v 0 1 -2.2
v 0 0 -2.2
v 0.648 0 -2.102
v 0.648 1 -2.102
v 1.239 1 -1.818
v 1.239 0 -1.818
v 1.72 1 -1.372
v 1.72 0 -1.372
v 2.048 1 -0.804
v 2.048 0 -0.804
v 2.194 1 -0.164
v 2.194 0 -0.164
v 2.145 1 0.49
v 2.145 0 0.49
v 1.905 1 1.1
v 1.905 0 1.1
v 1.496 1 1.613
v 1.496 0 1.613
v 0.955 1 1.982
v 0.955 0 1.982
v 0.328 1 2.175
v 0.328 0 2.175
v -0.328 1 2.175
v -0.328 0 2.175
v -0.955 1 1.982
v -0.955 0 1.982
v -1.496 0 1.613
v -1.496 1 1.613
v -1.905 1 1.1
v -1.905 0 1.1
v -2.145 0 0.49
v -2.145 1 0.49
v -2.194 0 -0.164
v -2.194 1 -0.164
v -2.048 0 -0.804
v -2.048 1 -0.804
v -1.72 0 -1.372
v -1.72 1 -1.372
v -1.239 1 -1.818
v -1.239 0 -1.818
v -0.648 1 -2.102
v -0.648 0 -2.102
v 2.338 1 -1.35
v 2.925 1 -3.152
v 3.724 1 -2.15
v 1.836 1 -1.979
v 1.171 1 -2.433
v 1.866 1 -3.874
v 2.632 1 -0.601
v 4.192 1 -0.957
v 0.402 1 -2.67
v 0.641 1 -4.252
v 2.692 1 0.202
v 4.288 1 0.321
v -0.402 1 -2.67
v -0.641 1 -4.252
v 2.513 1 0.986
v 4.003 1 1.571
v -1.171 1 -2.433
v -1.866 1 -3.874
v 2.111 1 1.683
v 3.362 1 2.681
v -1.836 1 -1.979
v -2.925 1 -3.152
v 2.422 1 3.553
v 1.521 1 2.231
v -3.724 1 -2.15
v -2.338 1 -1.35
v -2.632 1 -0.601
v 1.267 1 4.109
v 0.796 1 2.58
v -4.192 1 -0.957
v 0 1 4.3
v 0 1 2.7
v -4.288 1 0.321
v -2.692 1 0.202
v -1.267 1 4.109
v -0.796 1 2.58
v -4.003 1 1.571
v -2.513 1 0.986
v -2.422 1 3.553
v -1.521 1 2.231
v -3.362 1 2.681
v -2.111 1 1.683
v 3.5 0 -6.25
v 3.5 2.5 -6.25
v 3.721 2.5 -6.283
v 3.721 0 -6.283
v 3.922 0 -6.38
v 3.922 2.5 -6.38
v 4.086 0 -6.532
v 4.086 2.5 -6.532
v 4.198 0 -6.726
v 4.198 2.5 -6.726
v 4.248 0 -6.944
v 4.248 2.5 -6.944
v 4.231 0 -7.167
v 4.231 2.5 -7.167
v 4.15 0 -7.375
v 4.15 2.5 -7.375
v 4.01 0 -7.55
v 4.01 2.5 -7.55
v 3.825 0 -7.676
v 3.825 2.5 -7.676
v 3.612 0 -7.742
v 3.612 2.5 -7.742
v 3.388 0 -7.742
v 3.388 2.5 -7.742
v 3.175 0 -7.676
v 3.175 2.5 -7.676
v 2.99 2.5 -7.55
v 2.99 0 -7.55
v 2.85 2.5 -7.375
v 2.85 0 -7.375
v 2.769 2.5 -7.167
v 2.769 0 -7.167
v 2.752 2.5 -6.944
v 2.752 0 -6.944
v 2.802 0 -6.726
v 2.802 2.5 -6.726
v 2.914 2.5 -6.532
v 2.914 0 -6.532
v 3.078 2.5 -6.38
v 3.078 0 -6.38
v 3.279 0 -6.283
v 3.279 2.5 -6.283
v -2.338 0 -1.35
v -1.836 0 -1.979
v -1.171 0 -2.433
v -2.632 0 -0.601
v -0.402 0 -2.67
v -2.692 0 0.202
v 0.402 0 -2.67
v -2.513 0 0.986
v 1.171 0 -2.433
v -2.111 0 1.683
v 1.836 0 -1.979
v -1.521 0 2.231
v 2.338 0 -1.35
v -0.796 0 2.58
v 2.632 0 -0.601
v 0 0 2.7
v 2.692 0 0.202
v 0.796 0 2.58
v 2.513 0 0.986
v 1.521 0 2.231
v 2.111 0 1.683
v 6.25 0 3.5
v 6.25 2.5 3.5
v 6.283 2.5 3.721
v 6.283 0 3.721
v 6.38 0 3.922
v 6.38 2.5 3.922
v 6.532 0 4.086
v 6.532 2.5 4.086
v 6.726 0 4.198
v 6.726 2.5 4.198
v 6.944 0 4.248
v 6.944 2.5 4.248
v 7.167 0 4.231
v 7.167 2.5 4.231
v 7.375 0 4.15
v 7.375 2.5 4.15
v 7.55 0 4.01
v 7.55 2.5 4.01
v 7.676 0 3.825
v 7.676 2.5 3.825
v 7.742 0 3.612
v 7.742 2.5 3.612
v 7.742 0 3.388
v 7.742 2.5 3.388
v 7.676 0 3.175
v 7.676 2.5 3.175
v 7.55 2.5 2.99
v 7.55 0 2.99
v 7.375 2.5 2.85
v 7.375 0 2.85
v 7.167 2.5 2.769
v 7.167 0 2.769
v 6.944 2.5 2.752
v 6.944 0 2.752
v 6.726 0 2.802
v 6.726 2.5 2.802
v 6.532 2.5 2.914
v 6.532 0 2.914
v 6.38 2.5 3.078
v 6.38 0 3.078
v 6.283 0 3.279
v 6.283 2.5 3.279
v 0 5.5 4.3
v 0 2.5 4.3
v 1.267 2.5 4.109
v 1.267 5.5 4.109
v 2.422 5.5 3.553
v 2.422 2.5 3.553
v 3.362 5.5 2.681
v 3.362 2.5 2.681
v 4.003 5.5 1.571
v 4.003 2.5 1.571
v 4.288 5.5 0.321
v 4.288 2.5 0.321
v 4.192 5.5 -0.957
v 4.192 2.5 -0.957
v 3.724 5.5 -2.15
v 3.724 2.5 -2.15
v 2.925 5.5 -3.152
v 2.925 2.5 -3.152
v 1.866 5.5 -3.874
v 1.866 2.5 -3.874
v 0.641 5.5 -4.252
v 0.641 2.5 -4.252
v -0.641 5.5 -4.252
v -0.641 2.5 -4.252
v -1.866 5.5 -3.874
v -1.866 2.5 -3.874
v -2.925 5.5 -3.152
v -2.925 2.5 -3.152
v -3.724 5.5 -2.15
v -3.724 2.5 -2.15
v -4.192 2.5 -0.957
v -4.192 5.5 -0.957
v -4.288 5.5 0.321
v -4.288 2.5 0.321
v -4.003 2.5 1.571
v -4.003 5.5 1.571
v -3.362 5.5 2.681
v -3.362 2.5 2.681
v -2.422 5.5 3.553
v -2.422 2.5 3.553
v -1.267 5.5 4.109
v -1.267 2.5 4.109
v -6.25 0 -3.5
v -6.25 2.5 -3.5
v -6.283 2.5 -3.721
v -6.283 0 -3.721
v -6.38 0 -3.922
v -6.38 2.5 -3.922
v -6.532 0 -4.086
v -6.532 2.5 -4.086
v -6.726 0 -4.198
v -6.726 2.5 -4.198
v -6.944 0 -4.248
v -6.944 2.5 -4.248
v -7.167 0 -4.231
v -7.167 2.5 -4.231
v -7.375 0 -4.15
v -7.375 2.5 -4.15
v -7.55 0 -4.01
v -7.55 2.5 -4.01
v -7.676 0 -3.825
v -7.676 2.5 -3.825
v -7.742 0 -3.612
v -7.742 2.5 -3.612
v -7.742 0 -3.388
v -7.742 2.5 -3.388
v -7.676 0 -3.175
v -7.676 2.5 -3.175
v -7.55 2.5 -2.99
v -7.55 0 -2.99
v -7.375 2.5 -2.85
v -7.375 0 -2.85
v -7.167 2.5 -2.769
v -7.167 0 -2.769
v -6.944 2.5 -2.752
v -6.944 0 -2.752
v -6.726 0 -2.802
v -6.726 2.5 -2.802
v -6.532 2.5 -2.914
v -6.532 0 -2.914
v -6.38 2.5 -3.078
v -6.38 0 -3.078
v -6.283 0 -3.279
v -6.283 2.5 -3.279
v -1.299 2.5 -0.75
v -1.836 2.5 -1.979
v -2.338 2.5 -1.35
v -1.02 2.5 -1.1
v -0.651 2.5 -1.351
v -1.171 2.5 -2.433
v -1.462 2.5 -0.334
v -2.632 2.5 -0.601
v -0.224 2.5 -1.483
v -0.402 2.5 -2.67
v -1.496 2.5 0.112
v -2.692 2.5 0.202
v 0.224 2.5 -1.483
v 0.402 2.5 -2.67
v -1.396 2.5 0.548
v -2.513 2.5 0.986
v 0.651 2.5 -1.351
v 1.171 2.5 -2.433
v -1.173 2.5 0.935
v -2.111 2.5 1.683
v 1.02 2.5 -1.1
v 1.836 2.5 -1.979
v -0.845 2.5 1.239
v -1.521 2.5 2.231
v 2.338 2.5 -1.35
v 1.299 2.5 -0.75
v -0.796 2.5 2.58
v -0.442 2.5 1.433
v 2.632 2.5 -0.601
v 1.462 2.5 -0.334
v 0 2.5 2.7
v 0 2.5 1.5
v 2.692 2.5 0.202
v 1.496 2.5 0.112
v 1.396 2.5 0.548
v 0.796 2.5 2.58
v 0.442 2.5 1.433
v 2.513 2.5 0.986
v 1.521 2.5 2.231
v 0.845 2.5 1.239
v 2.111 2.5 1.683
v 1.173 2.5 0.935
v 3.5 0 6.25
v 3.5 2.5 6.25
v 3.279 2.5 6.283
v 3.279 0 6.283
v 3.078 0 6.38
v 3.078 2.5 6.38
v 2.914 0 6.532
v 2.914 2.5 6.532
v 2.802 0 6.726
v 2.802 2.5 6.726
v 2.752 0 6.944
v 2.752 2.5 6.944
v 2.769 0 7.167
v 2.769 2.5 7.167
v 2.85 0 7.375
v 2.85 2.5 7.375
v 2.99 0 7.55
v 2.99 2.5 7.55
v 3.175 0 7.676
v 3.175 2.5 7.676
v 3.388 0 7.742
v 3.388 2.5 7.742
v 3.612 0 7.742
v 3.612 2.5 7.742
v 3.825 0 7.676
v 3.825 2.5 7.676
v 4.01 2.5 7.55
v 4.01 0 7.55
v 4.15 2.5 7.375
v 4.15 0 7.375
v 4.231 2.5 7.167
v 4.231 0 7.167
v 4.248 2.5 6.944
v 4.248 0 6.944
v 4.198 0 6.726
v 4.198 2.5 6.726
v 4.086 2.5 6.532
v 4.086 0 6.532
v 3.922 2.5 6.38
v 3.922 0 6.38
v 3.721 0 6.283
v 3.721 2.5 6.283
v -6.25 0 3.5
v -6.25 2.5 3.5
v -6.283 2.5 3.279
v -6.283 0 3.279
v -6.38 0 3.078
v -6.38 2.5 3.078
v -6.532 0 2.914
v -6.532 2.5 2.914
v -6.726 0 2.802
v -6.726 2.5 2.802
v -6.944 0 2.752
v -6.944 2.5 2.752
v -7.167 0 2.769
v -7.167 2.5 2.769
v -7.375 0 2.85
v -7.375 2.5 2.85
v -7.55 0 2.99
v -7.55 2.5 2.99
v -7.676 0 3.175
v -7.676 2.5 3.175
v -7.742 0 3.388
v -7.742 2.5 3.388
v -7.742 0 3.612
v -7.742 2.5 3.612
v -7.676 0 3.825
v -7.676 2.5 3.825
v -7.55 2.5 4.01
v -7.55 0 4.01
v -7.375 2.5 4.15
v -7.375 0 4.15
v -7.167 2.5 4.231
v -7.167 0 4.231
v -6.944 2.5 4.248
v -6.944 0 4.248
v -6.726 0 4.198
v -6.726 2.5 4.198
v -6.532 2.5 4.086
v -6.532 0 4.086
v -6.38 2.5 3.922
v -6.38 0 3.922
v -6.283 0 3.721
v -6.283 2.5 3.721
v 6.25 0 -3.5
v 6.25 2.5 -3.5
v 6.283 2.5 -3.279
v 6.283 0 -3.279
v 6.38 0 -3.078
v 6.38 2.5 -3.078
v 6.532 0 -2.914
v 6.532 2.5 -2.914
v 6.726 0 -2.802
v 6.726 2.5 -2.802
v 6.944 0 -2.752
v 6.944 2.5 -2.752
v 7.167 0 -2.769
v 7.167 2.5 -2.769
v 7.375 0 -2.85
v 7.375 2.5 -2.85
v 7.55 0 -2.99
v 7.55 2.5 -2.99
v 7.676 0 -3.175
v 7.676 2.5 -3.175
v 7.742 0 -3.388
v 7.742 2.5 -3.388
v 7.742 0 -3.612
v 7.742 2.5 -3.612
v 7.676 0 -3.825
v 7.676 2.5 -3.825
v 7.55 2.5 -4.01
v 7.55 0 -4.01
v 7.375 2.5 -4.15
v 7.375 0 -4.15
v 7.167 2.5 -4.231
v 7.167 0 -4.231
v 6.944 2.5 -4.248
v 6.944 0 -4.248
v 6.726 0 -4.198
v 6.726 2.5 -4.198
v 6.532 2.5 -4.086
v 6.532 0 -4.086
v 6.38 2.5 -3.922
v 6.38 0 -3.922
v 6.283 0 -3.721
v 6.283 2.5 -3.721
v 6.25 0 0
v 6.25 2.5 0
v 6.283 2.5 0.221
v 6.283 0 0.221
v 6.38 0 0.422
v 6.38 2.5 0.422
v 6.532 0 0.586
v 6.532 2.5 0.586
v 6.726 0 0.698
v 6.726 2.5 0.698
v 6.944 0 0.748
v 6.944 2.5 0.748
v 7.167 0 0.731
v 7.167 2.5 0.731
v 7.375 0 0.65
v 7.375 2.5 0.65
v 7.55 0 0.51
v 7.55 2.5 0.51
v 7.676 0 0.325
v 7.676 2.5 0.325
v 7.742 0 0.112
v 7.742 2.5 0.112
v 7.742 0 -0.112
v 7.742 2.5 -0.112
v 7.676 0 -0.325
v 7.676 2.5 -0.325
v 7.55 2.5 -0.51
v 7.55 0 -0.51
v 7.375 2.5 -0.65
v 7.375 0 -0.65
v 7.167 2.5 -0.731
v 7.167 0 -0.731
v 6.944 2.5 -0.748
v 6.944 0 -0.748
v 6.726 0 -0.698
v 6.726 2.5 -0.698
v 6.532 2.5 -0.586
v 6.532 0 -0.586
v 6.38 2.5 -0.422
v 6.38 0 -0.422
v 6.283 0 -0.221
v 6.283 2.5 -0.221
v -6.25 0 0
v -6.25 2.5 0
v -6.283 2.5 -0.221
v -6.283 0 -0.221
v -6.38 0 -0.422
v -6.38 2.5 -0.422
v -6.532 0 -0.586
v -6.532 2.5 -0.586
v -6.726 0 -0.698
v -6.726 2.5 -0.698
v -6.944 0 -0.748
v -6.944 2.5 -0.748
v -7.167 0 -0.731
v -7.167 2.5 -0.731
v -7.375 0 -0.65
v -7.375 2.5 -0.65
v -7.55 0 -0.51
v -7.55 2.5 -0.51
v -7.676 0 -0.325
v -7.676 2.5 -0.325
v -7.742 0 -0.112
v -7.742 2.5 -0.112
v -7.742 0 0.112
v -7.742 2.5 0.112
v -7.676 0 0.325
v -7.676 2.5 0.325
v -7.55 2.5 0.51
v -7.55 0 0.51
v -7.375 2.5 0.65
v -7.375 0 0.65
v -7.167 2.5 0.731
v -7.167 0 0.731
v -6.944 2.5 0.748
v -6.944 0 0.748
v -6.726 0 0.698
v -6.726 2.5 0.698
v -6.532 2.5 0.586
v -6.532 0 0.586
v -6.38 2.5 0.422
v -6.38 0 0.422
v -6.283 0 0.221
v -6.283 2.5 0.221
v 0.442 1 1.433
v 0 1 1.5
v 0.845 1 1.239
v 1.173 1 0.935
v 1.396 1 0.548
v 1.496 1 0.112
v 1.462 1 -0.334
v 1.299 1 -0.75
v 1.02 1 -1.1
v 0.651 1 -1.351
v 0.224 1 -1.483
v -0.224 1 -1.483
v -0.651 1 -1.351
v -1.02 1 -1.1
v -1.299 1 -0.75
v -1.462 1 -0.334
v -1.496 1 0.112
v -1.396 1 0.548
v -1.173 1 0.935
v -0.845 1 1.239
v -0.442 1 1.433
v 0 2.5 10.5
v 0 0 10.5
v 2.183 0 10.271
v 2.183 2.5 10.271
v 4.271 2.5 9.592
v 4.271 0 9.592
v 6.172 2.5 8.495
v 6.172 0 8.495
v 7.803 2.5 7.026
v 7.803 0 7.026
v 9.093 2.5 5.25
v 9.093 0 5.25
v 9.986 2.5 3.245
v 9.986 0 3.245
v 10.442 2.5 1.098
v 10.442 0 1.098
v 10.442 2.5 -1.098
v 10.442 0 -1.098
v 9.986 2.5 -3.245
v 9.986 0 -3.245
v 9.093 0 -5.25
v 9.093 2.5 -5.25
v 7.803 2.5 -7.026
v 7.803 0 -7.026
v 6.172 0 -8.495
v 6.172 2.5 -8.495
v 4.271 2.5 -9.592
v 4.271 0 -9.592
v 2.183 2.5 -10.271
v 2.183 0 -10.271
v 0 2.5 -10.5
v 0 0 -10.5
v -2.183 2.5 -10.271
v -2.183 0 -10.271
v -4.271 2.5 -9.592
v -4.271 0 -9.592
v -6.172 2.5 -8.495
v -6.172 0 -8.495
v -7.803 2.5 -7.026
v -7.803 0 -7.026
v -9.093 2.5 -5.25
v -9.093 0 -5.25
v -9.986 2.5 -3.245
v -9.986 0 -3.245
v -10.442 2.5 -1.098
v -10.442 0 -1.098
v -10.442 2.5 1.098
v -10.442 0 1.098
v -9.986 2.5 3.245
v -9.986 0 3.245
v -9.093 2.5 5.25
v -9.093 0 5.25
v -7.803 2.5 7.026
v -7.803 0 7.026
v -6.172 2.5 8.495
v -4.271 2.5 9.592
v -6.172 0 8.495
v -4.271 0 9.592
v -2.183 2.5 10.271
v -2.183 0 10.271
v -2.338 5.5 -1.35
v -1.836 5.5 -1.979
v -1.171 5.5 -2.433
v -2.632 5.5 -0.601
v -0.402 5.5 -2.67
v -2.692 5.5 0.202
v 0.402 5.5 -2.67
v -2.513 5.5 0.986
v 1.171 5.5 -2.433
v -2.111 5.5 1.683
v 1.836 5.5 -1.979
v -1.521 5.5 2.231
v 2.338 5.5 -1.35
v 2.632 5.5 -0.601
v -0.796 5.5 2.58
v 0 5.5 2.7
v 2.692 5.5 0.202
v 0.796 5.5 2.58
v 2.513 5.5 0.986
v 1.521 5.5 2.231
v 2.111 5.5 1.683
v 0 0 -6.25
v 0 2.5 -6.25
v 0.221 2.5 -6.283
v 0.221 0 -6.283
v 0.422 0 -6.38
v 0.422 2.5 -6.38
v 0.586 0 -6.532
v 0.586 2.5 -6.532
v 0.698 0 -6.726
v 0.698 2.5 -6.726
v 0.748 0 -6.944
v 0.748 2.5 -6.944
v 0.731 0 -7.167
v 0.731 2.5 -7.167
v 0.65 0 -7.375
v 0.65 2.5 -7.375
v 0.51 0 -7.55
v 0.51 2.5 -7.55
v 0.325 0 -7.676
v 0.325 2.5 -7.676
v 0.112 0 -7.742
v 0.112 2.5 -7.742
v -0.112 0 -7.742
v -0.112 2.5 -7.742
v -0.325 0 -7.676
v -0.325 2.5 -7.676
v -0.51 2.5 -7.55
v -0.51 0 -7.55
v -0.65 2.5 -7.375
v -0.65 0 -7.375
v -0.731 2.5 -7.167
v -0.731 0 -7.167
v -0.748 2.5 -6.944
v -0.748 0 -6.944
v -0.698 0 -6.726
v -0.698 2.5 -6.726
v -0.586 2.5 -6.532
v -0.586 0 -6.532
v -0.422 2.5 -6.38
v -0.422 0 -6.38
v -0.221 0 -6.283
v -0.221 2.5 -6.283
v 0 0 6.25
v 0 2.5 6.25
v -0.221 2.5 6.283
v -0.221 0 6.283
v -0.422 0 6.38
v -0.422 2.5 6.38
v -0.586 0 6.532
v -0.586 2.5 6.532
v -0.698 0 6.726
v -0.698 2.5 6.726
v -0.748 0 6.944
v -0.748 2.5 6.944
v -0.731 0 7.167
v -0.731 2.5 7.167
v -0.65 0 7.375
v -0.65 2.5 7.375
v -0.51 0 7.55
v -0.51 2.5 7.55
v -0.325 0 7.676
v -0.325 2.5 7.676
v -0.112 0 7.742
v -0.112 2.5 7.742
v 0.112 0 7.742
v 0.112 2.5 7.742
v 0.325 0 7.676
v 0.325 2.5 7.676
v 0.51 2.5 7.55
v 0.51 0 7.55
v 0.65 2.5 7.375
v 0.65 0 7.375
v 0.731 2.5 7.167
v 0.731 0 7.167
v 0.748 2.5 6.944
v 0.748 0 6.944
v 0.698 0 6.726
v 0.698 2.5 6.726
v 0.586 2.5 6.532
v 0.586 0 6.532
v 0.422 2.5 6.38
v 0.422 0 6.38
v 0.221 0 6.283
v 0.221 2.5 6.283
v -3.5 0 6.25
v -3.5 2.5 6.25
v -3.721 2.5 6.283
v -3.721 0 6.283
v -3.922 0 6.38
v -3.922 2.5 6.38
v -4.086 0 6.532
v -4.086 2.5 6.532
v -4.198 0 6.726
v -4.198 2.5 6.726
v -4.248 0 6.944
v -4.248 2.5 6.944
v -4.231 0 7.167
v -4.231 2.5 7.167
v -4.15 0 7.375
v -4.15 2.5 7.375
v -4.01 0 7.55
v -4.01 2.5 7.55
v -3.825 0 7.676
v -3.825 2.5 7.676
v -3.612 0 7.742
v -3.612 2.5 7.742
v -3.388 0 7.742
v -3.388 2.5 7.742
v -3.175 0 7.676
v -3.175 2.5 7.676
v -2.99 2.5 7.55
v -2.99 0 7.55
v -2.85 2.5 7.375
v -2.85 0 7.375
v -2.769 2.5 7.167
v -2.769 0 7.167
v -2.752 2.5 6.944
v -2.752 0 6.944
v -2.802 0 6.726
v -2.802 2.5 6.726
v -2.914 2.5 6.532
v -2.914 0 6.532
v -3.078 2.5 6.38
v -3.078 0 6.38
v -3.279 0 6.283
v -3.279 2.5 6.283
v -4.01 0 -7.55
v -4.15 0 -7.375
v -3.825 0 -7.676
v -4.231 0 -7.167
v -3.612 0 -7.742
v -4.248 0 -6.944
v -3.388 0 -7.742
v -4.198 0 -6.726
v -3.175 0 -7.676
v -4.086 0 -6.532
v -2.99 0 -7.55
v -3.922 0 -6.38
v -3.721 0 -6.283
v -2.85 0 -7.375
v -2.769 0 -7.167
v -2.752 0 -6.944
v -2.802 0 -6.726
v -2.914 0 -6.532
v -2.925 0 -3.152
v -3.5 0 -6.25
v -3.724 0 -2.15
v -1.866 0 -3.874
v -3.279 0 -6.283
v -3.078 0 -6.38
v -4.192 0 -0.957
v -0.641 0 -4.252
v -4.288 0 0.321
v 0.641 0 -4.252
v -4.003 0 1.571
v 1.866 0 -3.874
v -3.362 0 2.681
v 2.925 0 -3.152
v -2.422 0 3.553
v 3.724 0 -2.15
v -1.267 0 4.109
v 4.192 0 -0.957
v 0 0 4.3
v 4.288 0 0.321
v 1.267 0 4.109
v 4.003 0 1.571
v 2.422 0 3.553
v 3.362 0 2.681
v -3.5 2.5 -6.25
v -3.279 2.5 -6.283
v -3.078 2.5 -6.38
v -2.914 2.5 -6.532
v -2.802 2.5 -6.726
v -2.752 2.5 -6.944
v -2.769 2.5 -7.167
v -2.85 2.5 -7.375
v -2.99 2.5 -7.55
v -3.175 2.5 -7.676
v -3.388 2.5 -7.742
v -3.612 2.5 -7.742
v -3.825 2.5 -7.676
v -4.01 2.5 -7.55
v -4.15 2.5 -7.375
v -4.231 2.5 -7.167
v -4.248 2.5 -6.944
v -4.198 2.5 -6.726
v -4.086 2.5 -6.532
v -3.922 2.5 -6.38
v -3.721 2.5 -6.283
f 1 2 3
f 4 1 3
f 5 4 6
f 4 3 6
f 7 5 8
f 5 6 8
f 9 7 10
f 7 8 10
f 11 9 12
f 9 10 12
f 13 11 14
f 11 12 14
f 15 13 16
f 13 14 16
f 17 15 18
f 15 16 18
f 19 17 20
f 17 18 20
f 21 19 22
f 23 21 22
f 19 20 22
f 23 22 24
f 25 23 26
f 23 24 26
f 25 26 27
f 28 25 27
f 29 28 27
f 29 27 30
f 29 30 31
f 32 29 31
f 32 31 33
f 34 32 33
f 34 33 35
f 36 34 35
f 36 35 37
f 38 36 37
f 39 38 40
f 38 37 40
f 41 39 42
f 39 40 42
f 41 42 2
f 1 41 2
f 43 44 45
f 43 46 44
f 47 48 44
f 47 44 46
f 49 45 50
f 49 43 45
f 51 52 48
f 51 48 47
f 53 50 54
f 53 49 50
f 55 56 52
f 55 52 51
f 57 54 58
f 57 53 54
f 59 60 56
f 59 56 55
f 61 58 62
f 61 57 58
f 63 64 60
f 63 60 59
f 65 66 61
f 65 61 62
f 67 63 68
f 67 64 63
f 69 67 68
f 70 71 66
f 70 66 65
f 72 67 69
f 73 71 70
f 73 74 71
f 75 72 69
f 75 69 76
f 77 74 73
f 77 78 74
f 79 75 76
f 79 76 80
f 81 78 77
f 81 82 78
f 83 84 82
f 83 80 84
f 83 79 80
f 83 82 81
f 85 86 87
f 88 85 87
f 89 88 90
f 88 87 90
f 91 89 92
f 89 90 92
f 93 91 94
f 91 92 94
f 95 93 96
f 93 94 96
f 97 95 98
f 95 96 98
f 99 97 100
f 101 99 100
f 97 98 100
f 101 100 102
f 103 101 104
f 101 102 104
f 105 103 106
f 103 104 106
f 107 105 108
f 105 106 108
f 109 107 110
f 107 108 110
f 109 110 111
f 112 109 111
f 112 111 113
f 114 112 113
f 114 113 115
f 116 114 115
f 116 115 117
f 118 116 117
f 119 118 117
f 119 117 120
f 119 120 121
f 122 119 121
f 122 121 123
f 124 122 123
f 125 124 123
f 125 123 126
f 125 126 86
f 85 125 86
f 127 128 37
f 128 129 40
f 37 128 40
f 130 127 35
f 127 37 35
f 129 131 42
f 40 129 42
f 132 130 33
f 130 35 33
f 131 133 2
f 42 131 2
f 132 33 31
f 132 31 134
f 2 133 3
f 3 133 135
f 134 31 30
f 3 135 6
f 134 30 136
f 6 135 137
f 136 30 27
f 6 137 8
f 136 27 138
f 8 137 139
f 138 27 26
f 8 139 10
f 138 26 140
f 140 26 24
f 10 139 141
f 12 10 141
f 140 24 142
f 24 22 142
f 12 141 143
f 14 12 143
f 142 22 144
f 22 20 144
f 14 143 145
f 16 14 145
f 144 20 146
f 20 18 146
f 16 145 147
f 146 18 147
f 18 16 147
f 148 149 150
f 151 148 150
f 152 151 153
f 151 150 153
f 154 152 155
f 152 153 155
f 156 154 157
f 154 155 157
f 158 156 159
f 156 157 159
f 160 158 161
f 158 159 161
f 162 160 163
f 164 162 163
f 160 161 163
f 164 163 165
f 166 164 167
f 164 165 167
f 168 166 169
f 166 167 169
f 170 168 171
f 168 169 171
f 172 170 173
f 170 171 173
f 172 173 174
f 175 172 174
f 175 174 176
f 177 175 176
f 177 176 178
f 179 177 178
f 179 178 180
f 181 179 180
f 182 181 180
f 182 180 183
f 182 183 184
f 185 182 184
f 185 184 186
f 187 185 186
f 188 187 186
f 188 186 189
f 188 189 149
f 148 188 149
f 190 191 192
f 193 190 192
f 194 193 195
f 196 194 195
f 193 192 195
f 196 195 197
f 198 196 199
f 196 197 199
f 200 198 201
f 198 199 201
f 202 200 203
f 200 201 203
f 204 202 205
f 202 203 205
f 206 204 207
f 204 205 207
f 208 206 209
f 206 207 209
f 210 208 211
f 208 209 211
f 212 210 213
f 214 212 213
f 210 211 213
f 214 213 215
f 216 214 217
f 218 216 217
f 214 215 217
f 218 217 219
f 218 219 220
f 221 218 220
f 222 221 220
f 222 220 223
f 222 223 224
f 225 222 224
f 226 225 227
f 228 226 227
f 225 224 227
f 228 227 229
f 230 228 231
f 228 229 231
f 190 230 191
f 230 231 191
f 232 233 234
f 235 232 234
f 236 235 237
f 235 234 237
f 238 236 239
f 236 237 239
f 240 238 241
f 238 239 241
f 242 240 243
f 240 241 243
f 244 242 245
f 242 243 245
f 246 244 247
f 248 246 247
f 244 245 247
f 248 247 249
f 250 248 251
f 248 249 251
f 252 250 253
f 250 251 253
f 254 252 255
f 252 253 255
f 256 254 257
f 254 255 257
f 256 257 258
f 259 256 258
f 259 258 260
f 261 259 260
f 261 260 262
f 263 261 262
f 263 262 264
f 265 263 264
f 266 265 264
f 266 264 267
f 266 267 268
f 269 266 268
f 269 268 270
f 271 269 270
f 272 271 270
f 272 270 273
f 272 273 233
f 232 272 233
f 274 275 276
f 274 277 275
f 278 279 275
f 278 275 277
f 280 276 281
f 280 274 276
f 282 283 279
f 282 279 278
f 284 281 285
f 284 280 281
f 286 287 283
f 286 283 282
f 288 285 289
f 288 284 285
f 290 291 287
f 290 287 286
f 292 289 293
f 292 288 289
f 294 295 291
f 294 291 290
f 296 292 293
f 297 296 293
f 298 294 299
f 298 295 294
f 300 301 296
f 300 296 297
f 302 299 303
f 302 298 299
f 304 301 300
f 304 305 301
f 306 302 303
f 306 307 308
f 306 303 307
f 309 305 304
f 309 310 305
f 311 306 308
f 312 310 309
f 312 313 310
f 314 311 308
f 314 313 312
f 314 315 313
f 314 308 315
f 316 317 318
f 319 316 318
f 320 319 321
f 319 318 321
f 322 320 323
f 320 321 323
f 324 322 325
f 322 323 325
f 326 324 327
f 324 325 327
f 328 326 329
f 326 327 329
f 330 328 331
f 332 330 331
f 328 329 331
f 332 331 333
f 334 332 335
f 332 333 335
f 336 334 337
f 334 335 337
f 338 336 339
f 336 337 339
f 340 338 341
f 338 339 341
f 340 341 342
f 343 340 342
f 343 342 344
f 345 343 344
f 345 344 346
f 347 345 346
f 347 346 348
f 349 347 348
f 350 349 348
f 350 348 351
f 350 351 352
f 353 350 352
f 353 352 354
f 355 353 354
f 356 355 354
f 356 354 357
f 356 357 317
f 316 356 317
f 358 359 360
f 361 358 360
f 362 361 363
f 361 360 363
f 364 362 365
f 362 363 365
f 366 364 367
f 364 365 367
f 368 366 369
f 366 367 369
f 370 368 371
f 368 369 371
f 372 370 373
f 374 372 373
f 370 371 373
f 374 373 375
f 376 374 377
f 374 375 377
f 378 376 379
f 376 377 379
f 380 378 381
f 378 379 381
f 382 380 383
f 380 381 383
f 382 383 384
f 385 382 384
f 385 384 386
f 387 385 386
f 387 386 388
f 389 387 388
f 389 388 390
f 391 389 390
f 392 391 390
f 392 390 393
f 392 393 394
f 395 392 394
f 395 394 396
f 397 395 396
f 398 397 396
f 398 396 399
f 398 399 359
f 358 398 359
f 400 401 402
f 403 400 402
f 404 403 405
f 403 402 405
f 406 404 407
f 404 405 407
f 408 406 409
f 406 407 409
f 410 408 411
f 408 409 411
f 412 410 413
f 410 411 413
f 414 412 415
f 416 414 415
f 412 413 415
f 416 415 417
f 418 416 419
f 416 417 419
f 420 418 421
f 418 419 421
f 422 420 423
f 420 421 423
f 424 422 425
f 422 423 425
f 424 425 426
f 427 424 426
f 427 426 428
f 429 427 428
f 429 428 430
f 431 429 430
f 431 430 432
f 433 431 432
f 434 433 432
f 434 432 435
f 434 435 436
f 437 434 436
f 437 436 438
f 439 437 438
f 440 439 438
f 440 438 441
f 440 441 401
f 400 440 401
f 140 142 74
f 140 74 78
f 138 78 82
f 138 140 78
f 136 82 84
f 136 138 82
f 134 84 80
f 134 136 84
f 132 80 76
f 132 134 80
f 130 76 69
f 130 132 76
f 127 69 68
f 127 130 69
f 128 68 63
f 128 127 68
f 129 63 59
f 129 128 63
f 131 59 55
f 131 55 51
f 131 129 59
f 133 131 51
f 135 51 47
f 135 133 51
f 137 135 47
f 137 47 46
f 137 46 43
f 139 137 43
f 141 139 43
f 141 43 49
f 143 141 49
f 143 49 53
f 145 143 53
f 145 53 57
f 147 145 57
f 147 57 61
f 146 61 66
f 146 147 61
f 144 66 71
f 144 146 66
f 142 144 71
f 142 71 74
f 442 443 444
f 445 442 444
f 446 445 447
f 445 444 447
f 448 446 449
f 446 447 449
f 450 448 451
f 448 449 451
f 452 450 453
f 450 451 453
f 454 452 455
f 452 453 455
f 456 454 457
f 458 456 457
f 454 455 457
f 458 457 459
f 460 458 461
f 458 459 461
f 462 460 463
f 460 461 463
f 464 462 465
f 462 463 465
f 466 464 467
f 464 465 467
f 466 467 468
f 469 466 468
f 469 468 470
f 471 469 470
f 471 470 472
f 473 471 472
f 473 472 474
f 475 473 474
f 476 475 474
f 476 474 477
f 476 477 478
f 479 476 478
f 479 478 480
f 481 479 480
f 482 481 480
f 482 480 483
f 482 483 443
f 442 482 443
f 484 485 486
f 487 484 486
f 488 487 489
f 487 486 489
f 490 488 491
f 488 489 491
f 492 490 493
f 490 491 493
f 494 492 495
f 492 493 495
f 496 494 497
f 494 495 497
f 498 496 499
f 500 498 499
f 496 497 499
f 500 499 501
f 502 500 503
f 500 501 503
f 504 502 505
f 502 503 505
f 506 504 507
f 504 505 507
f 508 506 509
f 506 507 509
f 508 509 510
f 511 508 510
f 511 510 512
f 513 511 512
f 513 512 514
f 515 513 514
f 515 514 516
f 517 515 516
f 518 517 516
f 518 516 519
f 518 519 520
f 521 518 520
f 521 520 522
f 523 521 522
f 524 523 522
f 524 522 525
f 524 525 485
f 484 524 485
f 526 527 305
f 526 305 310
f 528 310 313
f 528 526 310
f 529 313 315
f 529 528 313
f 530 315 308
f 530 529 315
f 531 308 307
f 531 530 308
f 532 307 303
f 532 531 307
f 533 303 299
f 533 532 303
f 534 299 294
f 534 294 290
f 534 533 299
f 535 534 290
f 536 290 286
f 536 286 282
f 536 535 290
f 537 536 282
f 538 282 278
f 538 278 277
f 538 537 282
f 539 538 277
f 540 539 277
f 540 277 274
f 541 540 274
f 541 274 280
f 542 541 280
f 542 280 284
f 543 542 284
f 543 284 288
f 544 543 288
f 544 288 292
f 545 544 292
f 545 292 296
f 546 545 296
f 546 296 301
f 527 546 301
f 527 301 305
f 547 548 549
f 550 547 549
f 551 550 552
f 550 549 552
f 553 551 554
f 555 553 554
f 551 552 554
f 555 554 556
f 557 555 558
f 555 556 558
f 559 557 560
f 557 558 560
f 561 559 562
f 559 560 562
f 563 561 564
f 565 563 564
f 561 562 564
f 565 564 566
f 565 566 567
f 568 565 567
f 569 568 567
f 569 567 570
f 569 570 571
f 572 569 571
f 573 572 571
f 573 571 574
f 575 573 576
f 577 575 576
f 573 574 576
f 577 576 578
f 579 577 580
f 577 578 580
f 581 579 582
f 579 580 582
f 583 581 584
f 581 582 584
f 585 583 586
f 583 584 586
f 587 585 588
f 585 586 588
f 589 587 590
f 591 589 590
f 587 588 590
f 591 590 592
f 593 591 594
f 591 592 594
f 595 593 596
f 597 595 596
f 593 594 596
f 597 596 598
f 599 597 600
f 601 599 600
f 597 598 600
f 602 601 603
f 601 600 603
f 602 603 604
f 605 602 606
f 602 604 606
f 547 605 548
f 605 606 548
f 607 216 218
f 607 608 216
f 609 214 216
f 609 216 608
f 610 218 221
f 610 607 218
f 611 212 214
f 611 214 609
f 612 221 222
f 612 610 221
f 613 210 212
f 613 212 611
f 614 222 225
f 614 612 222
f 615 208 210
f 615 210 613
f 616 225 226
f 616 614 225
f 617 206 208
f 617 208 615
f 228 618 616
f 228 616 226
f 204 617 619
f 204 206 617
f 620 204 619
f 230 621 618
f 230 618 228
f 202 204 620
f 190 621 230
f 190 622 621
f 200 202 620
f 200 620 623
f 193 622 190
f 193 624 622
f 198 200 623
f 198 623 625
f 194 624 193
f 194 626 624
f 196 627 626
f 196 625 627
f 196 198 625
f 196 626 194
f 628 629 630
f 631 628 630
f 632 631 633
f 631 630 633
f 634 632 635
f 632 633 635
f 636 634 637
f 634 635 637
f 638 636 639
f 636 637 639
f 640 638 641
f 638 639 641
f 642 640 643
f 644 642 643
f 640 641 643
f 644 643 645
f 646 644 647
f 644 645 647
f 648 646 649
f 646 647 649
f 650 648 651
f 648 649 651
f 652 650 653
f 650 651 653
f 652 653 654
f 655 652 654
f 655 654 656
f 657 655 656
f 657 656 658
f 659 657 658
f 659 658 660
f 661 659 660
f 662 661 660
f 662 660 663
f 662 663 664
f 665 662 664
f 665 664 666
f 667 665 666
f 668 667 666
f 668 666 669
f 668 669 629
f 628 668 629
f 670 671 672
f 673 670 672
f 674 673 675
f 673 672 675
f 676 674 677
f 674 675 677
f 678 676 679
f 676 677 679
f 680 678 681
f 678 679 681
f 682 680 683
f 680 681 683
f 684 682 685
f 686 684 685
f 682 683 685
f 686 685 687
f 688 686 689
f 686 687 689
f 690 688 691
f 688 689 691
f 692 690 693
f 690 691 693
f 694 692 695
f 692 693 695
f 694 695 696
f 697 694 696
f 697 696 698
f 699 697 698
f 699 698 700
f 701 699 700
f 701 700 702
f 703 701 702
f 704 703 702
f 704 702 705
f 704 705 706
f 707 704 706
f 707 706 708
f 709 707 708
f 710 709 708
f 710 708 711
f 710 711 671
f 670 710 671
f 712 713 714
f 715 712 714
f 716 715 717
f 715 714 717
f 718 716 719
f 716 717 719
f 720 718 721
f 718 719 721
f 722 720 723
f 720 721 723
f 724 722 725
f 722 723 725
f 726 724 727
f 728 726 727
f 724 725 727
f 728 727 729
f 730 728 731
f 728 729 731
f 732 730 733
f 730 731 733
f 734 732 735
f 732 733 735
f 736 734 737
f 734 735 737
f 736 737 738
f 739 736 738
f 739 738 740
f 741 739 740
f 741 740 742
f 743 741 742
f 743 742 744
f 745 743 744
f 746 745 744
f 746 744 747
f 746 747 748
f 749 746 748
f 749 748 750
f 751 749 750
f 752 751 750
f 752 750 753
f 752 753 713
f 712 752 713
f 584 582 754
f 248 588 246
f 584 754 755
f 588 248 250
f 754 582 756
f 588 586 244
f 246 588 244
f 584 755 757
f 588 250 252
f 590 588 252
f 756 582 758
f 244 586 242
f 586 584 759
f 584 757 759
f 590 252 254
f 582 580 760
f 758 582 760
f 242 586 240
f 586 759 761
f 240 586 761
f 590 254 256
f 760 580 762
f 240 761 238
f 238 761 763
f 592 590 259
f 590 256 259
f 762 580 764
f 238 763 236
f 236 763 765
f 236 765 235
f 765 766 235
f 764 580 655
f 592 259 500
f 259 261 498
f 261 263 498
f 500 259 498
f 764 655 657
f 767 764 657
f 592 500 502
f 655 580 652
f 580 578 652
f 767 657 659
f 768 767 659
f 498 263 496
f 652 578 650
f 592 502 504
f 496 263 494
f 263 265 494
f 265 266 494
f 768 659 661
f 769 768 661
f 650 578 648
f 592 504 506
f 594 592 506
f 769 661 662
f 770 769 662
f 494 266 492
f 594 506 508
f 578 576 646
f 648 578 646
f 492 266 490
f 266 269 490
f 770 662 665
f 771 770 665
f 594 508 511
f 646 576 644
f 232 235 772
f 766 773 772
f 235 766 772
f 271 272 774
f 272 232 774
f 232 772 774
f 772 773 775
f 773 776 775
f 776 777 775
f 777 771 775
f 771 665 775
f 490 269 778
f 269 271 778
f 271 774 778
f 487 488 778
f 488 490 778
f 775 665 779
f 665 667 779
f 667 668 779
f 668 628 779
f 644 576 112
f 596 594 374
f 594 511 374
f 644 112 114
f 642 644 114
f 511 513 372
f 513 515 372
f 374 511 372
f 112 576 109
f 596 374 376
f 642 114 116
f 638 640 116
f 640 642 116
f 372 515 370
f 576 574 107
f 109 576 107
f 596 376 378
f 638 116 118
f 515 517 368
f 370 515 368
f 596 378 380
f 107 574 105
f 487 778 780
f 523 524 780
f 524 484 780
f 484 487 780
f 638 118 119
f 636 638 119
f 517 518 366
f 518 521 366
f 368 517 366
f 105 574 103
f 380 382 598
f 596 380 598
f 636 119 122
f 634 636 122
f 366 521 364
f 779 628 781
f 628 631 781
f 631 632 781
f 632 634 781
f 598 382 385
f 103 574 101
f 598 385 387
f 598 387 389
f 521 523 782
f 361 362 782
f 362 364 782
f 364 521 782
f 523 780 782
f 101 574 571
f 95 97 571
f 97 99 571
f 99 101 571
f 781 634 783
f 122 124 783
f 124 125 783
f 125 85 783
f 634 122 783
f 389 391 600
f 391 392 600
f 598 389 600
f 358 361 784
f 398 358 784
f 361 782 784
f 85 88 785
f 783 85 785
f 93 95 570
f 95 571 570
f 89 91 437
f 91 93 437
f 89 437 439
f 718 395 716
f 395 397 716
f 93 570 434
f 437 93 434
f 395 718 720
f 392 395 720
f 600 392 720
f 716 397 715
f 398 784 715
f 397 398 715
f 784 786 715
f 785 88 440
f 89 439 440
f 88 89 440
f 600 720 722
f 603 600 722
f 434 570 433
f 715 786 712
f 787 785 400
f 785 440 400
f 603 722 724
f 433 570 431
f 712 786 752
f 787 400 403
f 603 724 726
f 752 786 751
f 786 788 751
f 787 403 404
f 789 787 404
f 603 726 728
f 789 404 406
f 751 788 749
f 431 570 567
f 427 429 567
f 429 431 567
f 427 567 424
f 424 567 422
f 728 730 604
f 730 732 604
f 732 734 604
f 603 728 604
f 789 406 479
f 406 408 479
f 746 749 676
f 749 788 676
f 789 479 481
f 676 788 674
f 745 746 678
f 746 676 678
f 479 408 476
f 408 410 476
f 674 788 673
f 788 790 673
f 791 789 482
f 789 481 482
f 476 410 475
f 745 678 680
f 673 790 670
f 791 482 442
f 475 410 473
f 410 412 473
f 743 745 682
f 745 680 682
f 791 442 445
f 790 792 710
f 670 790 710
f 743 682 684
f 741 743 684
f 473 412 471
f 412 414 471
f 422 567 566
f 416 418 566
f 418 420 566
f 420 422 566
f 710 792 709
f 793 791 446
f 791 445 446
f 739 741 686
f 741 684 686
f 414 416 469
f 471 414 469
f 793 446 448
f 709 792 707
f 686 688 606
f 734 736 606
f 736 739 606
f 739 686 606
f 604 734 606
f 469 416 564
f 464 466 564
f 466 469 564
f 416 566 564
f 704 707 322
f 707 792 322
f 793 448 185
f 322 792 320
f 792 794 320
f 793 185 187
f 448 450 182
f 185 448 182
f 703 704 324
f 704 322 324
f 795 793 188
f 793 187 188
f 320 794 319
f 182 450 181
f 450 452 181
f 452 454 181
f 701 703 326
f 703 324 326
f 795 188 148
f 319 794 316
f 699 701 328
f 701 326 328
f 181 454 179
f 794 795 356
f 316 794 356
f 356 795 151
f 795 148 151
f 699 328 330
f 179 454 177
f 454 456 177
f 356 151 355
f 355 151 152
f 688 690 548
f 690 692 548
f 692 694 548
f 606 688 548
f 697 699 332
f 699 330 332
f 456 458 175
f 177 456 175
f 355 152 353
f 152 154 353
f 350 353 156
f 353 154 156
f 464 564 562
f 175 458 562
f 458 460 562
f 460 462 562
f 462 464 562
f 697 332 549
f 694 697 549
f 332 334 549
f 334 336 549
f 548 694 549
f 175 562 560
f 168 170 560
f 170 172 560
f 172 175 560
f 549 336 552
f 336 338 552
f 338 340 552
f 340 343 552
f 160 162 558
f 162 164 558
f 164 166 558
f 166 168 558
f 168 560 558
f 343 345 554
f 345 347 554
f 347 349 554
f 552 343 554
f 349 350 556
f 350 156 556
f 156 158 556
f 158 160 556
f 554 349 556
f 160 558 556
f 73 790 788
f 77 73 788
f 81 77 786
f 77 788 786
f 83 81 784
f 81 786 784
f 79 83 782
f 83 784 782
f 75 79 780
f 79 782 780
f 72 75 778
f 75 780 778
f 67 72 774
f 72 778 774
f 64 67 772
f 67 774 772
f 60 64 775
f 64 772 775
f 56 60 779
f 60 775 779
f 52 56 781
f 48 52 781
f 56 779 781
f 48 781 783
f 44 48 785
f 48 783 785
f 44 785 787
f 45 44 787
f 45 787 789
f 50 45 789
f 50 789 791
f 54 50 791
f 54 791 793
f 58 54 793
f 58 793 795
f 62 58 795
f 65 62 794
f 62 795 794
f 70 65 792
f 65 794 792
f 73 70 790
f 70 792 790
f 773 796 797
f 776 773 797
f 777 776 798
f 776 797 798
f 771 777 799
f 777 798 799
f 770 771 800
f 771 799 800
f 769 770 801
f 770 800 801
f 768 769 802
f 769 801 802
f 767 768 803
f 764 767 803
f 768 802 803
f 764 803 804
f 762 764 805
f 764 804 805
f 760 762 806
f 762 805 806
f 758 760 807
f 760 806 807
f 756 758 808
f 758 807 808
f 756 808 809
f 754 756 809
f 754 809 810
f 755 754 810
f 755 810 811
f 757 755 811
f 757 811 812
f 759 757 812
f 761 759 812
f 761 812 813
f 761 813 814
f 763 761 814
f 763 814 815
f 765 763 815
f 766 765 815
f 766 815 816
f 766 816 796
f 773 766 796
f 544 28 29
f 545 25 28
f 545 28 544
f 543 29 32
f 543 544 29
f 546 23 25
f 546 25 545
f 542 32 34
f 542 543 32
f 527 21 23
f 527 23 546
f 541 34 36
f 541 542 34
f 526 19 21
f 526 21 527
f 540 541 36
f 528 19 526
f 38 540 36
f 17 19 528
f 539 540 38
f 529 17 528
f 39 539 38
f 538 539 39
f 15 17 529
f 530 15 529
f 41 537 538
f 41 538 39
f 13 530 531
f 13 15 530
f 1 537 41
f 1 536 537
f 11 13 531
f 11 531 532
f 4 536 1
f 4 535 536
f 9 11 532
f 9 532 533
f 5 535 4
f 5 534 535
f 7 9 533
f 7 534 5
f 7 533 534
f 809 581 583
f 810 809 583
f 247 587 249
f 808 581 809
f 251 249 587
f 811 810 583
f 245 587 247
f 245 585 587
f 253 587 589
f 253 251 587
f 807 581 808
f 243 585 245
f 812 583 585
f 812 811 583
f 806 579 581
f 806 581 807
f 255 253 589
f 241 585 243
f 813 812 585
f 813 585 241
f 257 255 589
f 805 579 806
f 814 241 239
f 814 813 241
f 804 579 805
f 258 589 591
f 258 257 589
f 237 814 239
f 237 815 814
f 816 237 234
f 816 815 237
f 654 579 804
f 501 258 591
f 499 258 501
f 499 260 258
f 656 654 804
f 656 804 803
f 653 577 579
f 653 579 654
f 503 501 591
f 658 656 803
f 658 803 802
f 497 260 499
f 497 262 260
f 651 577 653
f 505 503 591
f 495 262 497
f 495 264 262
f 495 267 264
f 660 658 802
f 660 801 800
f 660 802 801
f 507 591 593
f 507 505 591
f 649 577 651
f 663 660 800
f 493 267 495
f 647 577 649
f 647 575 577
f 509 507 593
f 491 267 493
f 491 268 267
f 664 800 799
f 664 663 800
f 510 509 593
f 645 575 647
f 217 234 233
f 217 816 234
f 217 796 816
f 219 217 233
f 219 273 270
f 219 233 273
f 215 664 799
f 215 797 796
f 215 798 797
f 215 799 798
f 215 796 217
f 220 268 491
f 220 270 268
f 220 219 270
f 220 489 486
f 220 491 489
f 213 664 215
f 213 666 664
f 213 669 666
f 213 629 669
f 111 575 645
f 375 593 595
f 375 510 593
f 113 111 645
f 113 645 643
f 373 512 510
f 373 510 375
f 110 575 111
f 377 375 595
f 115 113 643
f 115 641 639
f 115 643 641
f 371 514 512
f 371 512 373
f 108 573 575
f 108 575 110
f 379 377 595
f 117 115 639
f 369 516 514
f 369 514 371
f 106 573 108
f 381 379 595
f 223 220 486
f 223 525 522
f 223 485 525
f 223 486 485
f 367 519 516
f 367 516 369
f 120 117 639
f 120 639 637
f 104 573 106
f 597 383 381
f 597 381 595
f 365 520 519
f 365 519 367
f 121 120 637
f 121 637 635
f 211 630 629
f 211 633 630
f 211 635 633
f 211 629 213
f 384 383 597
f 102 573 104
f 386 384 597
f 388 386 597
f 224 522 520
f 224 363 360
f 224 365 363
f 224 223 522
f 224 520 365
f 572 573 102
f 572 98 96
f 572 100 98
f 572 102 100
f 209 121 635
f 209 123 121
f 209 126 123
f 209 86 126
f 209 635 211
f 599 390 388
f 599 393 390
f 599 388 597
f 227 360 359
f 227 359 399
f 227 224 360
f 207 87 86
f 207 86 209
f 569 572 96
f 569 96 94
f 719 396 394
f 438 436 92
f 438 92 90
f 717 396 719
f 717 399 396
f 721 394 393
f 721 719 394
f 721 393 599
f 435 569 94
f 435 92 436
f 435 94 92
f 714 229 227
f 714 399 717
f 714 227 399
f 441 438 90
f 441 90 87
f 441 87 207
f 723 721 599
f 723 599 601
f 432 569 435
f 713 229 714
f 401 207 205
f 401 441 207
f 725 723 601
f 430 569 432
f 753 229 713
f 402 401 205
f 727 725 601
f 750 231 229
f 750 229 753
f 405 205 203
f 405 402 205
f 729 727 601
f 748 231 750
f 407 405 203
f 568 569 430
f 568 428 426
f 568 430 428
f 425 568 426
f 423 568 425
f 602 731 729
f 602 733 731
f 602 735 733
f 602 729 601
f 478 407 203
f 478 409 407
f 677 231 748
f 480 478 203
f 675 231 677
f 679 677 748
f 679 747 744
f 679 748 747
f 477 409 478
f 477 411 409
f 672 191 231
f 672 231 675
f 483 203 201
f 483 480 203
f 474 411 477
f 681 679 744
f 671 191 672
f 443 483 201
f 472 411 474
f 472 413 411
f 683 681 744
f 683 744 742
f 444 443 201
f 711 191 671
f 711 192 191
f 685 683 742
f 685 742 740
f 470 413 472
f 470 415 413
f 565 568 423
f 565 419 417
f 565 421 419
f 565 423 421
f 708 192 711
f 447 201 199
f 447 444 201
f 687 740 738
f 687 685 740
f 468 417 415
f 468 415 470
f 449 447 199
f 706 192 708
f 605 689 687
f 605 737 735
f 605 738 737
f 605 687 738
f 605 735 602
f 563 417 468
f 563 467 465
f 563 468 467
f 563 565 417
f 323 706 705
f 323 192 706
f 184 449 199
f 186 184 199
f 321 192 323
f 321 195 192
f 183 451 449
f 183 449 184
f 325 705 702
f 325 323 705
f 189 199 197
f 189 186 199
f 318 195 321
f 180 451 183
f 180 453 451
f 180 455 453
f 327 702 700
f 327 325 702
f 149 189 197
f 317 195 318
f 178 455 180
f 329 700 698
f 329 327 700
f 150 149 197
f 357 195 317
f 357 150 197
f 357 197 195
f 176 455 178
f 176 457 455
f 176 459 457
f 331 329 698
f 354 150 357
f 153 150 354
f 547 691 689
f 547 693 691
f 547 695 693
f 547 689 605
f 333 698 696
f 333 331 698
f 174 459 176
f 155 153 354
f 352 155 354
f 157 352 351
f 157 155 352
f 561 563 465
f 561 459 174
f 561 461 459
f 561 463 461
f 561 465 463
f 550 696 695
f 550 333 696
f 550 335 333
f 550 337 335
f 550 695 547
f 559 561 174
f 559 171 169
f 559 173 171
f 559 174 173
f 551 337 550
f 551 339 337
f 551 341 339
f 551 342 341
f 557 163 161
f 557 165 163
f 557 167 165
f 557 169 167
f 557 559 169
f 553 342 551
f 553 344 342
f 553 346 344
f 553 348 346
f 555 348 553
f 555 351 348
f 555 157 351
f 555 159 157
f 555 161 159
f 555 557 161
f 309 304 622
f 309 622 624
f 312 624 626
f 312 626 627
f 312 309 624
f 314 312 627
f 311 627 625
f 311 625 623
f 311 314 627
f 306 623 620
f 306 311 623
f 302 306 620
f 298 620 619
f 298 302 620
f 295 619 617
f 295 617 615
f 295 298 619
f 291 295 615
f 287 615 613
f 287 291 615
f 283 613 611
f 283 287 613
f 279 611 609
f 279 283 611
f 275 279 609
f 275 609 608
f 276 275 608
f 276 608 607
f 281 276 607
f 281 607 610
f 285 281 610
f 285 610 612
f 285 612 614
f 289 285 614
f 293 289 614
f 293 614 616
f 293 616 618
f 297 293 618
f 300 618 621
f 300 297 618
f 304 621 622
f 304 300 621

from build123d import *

# Parameters (mm, degrees)
SKETCH1_R           = 10.5
SKETCH1_R_2         = 1.5
BOSS_EXTRUDE1_DEPTH = 2.5
SKETCH2_R           = 4.3
SKETCH2_R_2         = 2.7
BOSS_EXTRUDE2_DEPTH = 3
SKETCH3_R           = 0.75
CUT_EXTRUDE1_DEPTH  = 16.149257408
CIRPATTERN1_COUNT   = 4
SKETCH4_R           = 4.3
SKETCH4_R_2         = 2.7
SKETCH4_R_3         = 2.2
SKETCH4_R_4         = 1.5
CUT_EXTRUDE2_DEPTH  = 1


with BuildPart() as part:
    # Sketch1 → Boss-Extrude1 (new body)
    with BuildSketch(Plane(origin=(0, 0, 0), x_dir=(1, 0, 0), z_dir=(0, 1, 0))):
        with Locations(Location((0, 0, 0), (0, 0, 270))):
            Circle(SKETCH1_R)
        with Locations(Location((0, 0, 0), (0, 0, 270))):
            Circle(SKETCH1_R_2, mode=Mode.SUBTRACT)
    extrude(amount=BOSS_EXTRUDE1_DEPTH)

    # Sketch2 → Boss-Extrude2 (add)
    with BuildSketch(Plane(origin=(0, 2.5, 0), x_dir=(1, 0, 0), z_dir=(0, 1, 0))):
        with Locations(Location((0, 0, 0), (0, 0, 270))):
            Circle(SKETCH2_R)
        with Locations(Location((0, 0, 0), (0, 0, 270))):
            Circle(SKETCH2_R_2, mode=Mode.SUBTRACT)
    extrude(amount=BOSS_EXTRUDE2_DEPTH)

    # Sketch3 → Cut-Extrude1 (cut, through all)
    with BuildSketch(Plane(origin=(0, 2.5, 0), x_dir=(1, 0, 0), z_dir=(0, 1, 0))):
        with Locations(Location((0, 7, 0), (0, 0, 270))):
            Circle(SKETCH3_R)
        with Locations(Location((3.5, 7, 0), (0, 0, 270))):
            Circle(SKETCH3_R)
        with Locations(Location((-3.5, 7, 0), (0, 0, 270))):
            Circle(SKETCH3_R)
    cut_extrude1 = extrude(amount=-CUT_EXTRUDE1_DEPTH, mode=Mode.SUBTRACT)

    # CirPattern1: Cut-Extrude1 ×4 about axis
    cirpattern1_axis = Axis((0, 0, 0), (0, 1, 0))
    for i in range(1, CIRPATTERN1_COUNT):
        add(cut_extrude1.rotate(cirpattern1_axis, i * 360 / CIRPATTERN1_COUNT), mode=Mode.SUBTRACT)

    # Sketch4 → Cut-Extrude2 (cut)
    # profile 1 of 2: a face of its own
    with BuildSketch(Plane.XZ):
        with Locations(Location((0, 0, 0), (0, 0, 90))):
            Circle(SKETCH4_R)
        with Locations(Location((0, 0, 0), (0, 0, 90))):
            Circle(SKETCH4_R_2, mode=Mode.SUBTRACT)
    # profile 2 of 2: a face of its own
    with BuildSketch(Plane.XZ):
        with Locations(Location((0, 0, 0), (0, 0, 270))):
            Circle(SKETCH4_R_3)
        with Locations(Location((0, 0, 0), (0, 0, 270))):
            Circle(SKETCH4_R_4, mode=Mode.SUBTRACT)
    extrude(amount=-CUT_EXTRUDE2_DEPTH, mode=Mode.SUBTRACT)


solid = part.part
